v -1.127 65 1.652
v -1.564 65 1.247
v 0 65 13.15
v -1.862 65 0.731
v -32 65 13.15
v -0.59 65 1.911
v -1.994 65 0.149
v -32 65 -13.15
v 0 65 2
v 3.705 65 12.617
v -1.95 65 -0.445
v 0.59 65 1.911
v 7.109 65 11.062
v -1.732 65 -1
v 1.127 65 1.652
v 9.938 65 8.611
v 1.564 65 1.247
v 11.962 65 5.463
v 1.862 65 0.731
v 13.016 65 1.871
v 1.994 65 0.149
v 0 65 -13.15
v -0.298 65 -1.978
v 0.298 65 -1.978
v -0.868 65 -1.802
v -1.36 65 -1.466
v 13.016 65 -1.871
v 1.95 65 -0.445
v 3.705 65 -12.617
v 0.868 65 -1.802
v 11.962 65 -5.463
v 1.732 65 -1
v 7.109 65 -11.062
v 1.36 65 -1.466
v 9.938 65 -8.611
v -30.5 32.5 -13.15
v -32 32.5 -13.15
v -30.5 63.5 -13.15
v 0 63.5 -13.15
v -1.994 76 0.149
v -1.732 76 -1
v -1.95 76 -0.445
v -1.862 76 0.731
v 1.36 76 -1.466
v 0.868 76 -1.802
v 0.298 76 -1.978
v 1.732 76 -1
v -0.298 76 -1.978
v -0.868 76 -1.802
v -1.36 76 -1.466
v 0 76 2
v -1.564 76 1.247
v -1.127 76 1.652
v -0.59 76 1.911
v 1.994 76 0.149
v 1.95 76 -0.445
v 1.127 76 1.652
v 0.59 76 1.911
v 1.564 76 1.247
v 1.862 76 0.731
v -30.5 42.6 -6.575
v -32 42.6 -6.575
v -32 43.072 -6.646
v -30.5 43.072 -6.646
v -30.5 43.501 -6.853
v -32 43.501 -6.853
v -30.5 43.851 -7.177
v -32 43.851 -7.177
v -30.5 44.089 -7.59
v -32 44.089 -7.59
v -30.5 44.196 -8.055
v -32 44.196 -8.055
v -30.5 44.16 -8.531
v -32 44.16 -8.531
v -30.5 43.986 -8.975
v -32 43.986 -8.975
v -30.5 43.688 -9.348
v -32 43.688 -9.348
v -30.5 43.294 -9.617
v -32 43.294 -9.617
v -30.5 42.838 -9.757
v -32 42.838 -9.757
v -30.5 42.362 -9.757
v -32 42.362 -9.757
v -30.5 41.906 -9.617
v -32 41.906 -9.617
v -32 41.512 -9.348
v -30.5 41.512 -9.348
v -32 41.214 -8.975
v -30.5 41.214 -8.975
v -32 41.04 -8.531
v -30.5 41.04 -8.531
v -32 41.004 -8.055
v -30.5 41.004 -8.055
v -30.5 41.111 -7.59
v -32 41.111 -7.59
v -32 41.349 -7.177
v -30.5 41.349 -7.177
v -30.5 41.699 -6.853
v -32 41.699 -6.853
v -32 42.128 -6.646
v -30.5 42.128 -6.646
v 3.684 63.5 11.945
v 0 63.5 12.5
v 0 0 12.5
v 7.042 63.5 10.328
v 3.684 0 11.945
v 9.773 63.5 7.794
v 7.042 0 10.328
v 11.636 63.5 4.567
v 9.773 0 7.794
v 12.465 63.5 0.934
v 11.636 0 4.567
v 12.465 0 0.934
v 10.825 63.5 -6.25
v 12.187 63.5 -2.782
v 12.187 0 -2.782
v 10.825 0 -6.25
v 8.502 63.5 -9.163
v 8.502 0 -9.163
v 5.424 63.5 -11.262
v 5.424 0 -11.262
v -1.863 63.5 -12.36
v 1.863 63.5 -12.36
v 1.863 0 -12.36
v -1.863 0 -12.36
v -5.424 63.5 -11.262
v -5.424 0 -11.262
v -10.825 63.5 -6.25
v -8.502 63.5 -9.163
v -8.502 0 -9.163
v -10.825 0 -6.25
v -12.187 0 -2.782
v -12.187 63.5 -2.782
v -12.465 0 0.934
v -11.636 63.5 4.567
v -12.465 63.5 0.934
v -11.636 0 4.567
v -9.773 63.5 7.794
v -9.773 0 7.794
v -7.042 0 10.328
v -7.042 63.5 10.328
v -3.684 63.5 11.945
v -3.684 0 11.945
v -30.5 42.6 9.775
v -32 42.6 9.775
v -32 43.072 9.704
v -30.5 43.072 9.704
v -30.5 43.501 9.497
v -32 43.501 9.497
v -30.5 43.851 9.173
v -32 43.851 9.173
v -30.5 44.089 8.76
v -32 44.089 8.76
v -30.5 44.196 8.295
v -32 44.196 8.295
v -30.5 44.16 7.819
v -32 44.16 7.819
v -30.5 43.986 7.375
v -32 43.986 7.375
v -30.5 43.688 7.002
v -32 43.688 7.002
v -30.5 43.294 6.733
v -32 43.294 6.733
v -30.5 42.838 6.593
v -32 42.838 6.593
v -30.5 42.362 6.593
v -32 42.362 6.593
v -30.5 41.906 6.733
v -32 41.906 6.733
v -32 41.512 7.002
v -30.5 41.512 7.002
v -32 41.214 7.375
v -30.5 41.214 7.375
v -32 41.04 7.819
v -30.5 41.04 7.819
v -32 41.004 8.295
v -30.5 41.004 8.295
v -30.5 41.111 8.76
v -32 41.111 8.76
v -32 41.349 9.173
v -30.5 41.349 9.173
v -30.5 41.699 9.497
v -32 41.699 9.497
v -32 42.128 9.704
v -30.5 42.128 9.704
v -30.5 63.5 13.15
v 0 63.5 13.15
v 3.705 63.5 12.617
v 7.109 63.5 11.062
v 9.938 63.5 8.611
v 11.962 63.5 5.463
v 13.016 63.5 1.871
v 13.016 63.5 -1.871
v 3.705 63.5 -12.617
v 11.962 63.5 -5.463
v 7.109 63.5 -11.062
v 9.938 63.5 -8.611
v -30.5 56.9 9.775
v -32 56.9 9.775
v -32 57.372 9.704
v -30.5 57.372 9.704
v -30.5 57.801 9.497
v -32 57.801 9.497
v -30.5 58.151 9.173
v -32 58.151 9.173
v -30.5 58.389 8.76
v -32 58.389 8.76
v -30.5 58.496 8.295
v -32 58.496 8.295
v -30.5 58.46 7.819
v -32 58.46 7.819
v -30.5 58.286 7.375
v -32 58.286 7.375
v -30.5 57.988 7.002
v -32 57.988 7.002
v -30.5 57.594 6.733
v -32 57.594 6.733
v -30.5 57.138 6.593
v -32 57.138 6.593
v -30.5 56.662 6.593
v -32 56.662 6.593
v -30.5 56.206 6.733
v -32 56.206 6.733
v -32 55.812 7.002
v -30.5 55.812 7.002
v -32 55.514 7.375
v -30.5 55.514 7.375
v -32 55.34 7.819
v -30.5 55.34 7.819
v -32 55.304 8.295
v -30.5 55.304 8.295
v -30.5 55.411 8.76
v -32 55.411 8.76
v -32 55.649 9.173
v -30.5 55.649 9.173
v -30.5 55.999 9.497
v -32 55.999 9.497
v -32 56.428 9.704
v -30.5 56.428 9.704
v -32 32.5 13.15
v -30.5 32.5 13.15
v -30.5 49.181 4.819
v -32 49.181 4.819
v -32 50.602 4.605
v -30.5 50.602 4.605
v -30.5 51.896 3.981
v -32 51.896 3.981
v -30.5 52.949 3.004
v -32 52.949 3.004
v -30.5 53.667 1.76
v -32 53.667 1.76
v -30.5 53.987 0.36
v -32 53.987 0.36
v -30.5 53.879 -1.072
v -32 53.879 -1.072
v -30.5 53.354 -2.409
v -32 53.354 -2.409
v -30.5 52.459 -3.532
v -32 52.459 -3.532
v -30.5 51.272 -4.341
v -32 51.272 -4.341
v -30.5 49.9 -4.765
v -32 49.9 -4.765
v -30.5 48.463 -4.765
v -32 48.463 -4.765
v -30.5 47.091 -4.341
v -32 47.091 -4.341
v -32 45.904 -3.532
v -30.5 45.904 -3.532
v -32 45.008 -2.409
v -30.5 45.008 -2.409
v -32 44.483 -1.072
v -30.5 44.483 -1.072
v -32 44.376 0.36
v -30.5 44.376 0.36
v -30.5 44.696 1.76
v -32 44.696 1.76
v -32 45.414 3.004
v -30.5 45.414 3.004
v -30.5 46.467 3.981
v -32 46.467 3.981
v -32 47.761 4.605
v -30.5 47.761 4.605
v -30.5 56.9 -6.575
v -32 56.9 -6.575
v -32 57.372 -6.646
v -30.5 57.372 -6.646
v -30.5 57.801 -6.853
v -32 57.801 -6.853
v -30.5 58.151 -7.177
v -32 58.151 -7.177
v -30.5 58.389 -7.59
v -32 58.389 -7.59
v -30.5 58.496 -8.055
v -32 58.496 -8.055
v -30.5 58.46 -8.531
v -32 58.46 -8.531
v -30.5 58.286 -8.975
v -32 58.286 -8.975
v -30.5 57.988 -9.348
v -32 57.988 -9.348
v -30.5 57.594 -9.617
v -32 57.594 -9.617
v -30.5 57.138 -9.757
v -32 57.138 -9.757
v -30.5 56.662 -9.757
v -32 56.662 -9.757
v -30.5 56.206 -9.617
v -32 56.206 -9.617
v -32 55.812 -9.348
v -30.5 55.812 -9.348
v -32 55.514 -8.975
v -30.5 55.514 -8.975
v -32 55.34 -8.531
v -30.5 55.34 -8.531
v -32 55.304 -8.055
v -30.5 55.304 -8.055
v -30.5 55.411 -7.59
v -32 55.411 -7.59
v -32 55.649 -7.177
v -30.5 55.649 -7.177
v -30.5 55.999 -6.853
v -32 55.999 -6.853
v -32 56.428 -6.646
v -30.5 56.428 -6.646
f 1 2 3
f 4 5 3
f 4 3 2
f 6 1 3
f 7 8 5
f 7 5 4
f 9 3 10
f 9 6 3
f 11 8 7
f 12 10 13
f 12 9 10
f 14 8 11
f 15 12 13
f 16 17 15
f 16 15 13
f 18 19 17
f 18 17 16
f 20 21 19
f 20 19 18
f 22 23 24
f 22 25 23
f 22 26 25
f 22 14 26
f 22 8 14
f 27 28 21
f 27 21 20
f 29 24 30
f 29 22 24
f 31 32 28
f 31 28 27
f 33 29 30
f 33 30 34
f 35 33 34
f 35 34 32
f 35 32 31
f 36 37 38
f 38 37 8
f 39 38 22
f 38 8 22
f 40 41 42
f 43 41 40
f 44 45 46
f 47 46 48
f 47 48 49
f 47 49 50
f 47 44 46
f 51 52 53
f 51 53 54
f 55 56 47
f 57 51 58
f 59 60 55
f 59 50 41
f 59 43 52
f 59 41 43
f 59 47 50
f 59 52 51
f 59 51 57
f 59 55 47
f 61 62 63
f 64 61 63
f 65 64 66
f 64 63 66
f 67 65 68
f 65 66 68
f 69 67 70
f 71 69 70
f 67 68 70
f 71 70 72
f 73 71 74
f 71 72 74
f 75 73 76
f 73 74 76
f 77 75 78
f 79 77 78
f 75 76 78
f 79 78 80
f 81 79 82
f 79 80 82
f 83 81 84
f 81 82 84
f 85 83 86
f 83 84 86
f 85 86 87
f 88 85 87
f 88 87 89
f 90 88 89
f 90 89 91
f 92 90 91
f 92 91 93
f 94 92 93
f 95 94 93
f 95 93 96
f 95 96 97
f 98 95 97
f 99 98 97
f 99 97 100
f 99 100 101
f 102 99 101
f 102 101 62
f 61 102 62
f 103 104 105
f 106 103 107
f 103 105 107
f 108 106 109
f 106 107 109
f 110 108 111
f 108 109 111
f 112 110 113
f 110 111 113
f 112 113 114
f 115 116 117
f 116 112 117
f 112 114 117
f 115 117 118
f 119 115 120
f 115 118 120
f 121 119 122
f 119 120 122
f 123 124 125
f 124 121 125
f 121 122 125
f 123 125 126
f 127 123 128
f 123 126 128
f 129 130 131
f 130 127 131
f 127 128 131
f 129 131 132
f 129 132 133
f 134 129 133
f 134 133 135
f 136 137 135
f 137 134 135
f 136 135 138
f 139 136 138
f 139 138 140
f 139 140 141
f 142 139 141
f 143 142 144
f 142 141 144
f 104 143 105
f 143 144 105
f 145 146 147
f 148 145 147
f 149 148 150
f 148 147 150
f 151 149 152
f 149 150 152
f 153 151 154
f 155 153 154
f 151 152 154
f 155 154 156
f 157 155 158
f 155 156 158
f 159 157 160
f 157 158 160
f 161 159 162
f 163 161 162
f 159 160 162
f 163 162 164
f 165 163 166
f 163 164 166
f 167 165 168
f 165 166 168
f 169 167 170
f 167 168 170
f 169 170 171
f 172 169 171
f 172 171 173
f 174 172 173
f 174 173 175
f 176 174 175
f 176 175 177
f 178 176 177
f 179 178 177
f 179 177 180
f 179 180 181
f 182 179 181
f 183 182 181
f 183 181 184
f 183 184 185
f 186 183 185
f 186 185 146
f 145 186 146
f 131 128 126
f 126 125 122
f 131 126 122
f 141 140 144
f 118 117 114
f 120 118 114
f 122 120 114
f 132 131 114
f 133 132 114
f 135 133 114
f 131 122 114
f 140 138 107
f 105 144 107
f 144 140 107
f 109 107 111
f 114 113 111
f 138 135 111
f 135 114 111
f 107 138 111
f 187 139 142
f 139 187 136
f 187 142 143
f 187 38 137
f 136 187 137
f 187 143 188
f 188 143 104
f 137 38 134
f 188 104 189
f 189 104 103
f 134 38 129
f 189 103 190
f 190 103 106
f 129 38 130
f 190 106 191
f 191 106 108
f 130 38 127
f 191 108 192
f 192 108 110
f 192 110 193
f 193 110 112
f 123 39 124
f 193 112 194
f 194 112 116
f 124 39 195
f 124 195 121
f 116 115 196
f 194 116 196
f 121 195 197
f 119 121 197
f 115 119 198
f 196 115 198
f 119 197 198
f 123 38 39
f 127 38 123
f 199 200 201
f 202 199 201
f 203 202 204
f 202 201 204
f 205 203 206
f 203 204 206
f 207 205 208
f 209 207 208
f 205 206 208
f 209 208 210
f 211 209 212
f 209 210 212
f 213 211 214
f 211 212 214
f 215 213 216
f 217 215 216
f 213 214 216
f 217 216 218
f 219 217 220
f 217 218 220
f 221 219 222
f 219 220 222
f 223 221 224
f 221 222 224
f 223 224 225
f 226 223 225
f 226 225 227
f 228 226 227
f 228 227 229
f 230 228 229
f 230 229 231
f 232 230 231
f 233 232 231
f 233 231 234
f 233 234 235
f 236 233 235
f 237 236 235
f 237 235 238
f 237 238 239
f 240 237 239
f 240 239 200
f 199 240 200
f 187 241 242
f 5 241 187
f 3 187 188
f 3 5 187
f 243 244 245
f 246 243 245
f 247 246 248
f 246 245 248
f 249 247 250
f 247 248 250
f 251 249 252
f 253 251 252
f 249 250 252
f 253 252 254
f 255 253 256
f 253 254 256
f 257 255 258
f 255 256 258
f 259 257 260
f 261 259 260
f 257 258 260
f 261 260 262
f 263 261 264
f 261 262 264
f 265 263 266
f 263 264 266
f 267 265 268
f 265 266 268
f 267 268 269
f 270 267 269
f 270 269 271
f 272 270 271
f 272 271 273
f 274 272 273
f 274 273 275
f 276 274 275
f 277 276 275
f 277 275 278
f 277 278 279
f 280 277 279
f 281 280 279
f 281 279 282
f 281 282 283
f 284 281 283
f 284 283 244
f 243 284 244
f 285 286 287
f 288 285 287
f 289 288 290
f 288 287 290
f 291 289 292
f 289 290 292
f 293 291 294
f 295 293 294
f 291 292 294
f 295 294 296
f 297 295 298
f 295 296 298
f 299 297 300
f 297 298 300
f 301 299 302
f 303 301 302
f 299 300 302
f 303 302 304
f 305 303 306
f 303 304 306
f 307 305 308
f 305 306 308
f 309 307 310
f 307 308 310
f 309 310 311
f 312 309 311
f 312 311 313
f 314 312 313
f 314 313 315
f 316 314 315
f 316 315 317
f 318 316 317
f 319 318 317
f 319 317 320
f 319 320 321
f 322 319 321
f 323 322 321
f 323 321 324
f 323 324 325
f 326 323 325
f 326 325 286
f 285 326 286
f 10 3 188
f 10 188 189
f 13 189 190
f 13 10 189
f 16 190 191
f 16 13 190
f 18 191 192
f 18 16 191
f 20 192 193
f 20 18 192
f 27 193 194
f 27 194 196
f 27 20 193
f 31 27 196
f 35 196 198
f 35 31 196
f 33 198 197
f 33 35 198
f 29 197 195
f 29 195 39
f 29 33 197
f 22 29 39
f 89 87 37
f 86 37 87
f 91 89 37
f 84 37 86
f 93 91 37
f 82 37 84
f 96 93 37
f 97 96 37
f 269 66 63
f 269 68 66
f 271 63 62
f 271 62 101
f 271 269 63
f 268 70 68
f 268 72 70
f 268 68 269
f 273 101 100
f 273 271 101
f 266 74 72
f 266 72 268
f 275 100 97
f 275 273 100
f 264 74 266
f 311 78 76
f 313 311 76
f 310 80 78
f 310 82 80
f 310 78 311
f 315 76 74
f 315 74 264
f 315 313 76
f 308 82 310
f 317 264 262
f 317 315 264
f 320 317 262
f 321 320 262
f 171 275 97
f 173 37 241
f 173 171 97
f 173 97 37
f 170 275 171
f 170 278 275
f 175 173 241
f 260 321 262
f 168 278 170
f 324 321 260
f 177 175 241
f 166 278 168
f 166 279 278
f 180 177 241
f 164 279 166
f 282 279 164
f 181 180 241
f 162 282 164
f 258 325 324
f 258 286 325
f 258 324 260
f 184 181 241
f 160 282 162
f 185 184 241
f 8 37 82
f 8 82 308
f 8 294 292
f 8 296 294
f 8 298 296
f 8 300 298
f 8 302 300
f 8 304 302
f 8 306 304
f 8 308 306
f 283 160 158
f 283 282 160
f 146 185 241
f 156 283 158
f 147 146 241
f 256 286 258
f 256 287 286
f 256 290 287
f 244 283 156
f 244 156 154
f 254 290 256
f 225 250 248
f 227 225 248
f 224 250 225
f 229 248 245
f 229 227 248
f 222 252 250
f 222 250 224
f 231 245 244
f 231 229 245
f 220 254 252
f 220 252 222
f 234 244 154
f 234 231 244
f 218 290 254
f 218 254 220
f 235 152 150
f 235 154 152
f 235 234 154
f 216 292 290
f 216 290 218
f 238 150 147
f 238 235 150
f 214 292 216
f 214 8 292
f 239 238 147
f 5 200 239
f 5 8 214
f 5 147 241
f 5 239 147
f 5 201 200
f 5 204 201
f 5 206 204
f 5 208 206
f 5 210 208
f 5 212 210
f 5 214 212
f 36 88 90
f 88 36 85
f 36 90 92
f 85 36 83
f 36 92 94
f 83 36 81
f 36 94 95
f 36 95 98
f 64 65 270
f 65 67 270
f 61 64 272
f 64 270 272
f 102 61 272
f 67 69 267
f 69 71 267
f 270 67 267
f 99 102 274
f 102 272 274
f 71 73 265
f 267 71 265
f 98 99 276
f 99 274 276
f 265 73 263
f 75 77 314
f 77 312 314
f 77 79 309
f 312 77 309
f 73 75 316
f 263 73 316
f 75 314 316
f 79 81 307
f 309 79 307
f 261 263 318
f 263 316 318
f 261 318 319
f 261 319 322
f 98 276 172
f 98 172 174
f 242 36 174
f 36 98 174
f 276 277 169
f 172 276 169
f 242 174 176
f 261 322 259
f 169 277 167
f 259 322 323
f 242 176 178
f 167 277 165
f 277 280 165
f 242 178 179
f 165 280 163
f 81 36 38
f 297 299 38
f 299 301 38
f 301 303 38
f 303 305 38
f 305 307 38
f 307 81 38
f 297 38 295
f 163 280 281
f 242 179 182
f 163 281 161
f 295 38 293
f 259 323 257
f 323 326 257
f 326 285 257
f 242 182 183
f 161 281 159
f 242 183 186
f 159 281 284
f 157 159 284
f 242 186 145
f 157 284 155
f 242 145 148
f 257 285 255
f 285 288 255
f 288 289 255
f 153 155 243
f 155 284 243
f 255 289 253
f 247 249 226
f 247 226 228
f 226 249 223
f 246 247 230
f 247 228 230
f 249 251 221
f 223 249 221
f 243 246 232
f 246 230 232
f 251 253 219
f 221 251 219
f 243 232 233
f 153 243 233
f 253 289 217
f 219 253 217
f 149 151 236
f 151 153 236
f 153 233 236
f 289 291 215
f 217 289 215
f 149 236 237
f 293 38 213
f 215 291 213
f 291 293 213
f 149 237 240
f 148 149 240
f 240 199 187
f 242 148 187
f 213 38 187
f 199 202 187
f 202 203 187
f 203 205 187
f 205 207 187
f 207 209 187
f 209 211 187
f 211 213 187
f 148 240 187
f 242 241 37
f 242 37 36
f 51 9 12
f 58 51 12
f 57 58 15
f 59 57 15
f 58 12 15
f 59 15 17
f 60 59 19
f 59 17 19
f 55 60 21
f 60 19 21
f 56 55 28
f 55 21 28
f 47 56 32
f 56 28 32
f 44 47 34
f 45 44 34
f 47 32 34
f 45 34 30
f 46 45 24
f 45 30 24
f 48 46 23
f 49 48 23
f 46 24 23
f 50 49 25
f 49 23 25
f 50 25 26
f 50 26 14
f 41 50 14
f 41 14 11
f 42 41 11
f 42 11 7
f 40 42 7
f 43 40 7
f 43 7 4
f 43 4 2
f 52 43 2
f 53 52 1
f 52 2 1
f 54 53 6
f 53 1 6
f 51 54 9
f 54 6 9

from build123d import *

# Parameters (mm, degrees)
SKETCH1_R           = 12.5
BOSS_EXTRUDE1_DEPTH = 65
SKETCH3_R           = 2
BOSS_EXTRUDE2_DEPTH = 11
BOSS_EXTRUDE3_DEPTH = 1.5
SKETCH5_W           = 1.5
SKETCH5_H           = 26.3
BOSS_EXTRUDE4_DEPTH = 31
SKETCH6_R           = 4.818685959
SKETCH6_R_2         = 1.6
CUT_EXTRUDE1_DEPTH  = 11


with BuildPart() as part:
    # Sketch1 → Boss-Extrude1 (new body)
    with BuildSketch(Plane(origin=(0, 0, 0), x_dir=(1, 0, 0), z_dir=(0, 1, 0))):
        with Locations(Location((0, 0, 0), (0, 0, 270))):
            Circle(SKETCH1_R)
    extrude(amount=BOSS_EXTRUDE1_DEPTH)

    # Sketch3 → Boss-Extrude2 (add)
    with BuildSketch(Plane(origin=(0, 65, 0), x_dir=(1, 0, 0), z_dir=(0, 1, 0))):
        with Locations(Location((0, 0, 0), (0, 0, 270))):
            Circle(SKETCH3_R)
    extrude(amount=BOSS_EXTRUDE2_DEPTH)

    # Sketch4 → Boss-Extrude3 (add)
    with BuildSketch(Plane(origin=(0, 65, 0), x_dir=(1, 0, 0), z_dir=(0, 1, 0))):
        with BuildLine():
            Line((0, 13.15), (-32, 13.15))
            Line((-32, 13.15), (-32, -13.15))
            Line((-32, -13.15), (0, -13.15))
            ThreePointArc((0, -13.15), (13.15, 0), (0, 13.15))
        make_face()
    extrude(amount=-BOSS_EXTRUDE3_DEPTH)

    # Sketch5 → Boss-Extrude4 (add)
    with BuildSketch(Plane.XZ.offset(-63.5)):
        with Locations((-31.25, 0)):
            Rectangle(SKETCH5_W, SKETCH5_H)
    extrude(amount=BOSS_EXTRUDE4_DEPTH)

    # Sketch6 → Cut-Extrude1 (cut)
    with BuildSketch(Plane.ZY.offset(32)):
        with Locations((0, 49.181314041)):
            Circle(SKETCH6_R)
        with Locations((-8.175, 56.9)):
            Circle(SKETCH6_R_2)
        with Locations((8.175, 56.9)):
            Circle(SKETCH6_R_2)
        with Locations((8.175, 42.6)):
            Circle(SKETCH6_R_2)
        with Locations((-8.175, 42.6)):
            Circle(SKETCH6_R_2)
    extrude(amount=-CUT_EXTRUDE1_DEPTH, mode=Mode.SUBTRACT)


solid = part.part
